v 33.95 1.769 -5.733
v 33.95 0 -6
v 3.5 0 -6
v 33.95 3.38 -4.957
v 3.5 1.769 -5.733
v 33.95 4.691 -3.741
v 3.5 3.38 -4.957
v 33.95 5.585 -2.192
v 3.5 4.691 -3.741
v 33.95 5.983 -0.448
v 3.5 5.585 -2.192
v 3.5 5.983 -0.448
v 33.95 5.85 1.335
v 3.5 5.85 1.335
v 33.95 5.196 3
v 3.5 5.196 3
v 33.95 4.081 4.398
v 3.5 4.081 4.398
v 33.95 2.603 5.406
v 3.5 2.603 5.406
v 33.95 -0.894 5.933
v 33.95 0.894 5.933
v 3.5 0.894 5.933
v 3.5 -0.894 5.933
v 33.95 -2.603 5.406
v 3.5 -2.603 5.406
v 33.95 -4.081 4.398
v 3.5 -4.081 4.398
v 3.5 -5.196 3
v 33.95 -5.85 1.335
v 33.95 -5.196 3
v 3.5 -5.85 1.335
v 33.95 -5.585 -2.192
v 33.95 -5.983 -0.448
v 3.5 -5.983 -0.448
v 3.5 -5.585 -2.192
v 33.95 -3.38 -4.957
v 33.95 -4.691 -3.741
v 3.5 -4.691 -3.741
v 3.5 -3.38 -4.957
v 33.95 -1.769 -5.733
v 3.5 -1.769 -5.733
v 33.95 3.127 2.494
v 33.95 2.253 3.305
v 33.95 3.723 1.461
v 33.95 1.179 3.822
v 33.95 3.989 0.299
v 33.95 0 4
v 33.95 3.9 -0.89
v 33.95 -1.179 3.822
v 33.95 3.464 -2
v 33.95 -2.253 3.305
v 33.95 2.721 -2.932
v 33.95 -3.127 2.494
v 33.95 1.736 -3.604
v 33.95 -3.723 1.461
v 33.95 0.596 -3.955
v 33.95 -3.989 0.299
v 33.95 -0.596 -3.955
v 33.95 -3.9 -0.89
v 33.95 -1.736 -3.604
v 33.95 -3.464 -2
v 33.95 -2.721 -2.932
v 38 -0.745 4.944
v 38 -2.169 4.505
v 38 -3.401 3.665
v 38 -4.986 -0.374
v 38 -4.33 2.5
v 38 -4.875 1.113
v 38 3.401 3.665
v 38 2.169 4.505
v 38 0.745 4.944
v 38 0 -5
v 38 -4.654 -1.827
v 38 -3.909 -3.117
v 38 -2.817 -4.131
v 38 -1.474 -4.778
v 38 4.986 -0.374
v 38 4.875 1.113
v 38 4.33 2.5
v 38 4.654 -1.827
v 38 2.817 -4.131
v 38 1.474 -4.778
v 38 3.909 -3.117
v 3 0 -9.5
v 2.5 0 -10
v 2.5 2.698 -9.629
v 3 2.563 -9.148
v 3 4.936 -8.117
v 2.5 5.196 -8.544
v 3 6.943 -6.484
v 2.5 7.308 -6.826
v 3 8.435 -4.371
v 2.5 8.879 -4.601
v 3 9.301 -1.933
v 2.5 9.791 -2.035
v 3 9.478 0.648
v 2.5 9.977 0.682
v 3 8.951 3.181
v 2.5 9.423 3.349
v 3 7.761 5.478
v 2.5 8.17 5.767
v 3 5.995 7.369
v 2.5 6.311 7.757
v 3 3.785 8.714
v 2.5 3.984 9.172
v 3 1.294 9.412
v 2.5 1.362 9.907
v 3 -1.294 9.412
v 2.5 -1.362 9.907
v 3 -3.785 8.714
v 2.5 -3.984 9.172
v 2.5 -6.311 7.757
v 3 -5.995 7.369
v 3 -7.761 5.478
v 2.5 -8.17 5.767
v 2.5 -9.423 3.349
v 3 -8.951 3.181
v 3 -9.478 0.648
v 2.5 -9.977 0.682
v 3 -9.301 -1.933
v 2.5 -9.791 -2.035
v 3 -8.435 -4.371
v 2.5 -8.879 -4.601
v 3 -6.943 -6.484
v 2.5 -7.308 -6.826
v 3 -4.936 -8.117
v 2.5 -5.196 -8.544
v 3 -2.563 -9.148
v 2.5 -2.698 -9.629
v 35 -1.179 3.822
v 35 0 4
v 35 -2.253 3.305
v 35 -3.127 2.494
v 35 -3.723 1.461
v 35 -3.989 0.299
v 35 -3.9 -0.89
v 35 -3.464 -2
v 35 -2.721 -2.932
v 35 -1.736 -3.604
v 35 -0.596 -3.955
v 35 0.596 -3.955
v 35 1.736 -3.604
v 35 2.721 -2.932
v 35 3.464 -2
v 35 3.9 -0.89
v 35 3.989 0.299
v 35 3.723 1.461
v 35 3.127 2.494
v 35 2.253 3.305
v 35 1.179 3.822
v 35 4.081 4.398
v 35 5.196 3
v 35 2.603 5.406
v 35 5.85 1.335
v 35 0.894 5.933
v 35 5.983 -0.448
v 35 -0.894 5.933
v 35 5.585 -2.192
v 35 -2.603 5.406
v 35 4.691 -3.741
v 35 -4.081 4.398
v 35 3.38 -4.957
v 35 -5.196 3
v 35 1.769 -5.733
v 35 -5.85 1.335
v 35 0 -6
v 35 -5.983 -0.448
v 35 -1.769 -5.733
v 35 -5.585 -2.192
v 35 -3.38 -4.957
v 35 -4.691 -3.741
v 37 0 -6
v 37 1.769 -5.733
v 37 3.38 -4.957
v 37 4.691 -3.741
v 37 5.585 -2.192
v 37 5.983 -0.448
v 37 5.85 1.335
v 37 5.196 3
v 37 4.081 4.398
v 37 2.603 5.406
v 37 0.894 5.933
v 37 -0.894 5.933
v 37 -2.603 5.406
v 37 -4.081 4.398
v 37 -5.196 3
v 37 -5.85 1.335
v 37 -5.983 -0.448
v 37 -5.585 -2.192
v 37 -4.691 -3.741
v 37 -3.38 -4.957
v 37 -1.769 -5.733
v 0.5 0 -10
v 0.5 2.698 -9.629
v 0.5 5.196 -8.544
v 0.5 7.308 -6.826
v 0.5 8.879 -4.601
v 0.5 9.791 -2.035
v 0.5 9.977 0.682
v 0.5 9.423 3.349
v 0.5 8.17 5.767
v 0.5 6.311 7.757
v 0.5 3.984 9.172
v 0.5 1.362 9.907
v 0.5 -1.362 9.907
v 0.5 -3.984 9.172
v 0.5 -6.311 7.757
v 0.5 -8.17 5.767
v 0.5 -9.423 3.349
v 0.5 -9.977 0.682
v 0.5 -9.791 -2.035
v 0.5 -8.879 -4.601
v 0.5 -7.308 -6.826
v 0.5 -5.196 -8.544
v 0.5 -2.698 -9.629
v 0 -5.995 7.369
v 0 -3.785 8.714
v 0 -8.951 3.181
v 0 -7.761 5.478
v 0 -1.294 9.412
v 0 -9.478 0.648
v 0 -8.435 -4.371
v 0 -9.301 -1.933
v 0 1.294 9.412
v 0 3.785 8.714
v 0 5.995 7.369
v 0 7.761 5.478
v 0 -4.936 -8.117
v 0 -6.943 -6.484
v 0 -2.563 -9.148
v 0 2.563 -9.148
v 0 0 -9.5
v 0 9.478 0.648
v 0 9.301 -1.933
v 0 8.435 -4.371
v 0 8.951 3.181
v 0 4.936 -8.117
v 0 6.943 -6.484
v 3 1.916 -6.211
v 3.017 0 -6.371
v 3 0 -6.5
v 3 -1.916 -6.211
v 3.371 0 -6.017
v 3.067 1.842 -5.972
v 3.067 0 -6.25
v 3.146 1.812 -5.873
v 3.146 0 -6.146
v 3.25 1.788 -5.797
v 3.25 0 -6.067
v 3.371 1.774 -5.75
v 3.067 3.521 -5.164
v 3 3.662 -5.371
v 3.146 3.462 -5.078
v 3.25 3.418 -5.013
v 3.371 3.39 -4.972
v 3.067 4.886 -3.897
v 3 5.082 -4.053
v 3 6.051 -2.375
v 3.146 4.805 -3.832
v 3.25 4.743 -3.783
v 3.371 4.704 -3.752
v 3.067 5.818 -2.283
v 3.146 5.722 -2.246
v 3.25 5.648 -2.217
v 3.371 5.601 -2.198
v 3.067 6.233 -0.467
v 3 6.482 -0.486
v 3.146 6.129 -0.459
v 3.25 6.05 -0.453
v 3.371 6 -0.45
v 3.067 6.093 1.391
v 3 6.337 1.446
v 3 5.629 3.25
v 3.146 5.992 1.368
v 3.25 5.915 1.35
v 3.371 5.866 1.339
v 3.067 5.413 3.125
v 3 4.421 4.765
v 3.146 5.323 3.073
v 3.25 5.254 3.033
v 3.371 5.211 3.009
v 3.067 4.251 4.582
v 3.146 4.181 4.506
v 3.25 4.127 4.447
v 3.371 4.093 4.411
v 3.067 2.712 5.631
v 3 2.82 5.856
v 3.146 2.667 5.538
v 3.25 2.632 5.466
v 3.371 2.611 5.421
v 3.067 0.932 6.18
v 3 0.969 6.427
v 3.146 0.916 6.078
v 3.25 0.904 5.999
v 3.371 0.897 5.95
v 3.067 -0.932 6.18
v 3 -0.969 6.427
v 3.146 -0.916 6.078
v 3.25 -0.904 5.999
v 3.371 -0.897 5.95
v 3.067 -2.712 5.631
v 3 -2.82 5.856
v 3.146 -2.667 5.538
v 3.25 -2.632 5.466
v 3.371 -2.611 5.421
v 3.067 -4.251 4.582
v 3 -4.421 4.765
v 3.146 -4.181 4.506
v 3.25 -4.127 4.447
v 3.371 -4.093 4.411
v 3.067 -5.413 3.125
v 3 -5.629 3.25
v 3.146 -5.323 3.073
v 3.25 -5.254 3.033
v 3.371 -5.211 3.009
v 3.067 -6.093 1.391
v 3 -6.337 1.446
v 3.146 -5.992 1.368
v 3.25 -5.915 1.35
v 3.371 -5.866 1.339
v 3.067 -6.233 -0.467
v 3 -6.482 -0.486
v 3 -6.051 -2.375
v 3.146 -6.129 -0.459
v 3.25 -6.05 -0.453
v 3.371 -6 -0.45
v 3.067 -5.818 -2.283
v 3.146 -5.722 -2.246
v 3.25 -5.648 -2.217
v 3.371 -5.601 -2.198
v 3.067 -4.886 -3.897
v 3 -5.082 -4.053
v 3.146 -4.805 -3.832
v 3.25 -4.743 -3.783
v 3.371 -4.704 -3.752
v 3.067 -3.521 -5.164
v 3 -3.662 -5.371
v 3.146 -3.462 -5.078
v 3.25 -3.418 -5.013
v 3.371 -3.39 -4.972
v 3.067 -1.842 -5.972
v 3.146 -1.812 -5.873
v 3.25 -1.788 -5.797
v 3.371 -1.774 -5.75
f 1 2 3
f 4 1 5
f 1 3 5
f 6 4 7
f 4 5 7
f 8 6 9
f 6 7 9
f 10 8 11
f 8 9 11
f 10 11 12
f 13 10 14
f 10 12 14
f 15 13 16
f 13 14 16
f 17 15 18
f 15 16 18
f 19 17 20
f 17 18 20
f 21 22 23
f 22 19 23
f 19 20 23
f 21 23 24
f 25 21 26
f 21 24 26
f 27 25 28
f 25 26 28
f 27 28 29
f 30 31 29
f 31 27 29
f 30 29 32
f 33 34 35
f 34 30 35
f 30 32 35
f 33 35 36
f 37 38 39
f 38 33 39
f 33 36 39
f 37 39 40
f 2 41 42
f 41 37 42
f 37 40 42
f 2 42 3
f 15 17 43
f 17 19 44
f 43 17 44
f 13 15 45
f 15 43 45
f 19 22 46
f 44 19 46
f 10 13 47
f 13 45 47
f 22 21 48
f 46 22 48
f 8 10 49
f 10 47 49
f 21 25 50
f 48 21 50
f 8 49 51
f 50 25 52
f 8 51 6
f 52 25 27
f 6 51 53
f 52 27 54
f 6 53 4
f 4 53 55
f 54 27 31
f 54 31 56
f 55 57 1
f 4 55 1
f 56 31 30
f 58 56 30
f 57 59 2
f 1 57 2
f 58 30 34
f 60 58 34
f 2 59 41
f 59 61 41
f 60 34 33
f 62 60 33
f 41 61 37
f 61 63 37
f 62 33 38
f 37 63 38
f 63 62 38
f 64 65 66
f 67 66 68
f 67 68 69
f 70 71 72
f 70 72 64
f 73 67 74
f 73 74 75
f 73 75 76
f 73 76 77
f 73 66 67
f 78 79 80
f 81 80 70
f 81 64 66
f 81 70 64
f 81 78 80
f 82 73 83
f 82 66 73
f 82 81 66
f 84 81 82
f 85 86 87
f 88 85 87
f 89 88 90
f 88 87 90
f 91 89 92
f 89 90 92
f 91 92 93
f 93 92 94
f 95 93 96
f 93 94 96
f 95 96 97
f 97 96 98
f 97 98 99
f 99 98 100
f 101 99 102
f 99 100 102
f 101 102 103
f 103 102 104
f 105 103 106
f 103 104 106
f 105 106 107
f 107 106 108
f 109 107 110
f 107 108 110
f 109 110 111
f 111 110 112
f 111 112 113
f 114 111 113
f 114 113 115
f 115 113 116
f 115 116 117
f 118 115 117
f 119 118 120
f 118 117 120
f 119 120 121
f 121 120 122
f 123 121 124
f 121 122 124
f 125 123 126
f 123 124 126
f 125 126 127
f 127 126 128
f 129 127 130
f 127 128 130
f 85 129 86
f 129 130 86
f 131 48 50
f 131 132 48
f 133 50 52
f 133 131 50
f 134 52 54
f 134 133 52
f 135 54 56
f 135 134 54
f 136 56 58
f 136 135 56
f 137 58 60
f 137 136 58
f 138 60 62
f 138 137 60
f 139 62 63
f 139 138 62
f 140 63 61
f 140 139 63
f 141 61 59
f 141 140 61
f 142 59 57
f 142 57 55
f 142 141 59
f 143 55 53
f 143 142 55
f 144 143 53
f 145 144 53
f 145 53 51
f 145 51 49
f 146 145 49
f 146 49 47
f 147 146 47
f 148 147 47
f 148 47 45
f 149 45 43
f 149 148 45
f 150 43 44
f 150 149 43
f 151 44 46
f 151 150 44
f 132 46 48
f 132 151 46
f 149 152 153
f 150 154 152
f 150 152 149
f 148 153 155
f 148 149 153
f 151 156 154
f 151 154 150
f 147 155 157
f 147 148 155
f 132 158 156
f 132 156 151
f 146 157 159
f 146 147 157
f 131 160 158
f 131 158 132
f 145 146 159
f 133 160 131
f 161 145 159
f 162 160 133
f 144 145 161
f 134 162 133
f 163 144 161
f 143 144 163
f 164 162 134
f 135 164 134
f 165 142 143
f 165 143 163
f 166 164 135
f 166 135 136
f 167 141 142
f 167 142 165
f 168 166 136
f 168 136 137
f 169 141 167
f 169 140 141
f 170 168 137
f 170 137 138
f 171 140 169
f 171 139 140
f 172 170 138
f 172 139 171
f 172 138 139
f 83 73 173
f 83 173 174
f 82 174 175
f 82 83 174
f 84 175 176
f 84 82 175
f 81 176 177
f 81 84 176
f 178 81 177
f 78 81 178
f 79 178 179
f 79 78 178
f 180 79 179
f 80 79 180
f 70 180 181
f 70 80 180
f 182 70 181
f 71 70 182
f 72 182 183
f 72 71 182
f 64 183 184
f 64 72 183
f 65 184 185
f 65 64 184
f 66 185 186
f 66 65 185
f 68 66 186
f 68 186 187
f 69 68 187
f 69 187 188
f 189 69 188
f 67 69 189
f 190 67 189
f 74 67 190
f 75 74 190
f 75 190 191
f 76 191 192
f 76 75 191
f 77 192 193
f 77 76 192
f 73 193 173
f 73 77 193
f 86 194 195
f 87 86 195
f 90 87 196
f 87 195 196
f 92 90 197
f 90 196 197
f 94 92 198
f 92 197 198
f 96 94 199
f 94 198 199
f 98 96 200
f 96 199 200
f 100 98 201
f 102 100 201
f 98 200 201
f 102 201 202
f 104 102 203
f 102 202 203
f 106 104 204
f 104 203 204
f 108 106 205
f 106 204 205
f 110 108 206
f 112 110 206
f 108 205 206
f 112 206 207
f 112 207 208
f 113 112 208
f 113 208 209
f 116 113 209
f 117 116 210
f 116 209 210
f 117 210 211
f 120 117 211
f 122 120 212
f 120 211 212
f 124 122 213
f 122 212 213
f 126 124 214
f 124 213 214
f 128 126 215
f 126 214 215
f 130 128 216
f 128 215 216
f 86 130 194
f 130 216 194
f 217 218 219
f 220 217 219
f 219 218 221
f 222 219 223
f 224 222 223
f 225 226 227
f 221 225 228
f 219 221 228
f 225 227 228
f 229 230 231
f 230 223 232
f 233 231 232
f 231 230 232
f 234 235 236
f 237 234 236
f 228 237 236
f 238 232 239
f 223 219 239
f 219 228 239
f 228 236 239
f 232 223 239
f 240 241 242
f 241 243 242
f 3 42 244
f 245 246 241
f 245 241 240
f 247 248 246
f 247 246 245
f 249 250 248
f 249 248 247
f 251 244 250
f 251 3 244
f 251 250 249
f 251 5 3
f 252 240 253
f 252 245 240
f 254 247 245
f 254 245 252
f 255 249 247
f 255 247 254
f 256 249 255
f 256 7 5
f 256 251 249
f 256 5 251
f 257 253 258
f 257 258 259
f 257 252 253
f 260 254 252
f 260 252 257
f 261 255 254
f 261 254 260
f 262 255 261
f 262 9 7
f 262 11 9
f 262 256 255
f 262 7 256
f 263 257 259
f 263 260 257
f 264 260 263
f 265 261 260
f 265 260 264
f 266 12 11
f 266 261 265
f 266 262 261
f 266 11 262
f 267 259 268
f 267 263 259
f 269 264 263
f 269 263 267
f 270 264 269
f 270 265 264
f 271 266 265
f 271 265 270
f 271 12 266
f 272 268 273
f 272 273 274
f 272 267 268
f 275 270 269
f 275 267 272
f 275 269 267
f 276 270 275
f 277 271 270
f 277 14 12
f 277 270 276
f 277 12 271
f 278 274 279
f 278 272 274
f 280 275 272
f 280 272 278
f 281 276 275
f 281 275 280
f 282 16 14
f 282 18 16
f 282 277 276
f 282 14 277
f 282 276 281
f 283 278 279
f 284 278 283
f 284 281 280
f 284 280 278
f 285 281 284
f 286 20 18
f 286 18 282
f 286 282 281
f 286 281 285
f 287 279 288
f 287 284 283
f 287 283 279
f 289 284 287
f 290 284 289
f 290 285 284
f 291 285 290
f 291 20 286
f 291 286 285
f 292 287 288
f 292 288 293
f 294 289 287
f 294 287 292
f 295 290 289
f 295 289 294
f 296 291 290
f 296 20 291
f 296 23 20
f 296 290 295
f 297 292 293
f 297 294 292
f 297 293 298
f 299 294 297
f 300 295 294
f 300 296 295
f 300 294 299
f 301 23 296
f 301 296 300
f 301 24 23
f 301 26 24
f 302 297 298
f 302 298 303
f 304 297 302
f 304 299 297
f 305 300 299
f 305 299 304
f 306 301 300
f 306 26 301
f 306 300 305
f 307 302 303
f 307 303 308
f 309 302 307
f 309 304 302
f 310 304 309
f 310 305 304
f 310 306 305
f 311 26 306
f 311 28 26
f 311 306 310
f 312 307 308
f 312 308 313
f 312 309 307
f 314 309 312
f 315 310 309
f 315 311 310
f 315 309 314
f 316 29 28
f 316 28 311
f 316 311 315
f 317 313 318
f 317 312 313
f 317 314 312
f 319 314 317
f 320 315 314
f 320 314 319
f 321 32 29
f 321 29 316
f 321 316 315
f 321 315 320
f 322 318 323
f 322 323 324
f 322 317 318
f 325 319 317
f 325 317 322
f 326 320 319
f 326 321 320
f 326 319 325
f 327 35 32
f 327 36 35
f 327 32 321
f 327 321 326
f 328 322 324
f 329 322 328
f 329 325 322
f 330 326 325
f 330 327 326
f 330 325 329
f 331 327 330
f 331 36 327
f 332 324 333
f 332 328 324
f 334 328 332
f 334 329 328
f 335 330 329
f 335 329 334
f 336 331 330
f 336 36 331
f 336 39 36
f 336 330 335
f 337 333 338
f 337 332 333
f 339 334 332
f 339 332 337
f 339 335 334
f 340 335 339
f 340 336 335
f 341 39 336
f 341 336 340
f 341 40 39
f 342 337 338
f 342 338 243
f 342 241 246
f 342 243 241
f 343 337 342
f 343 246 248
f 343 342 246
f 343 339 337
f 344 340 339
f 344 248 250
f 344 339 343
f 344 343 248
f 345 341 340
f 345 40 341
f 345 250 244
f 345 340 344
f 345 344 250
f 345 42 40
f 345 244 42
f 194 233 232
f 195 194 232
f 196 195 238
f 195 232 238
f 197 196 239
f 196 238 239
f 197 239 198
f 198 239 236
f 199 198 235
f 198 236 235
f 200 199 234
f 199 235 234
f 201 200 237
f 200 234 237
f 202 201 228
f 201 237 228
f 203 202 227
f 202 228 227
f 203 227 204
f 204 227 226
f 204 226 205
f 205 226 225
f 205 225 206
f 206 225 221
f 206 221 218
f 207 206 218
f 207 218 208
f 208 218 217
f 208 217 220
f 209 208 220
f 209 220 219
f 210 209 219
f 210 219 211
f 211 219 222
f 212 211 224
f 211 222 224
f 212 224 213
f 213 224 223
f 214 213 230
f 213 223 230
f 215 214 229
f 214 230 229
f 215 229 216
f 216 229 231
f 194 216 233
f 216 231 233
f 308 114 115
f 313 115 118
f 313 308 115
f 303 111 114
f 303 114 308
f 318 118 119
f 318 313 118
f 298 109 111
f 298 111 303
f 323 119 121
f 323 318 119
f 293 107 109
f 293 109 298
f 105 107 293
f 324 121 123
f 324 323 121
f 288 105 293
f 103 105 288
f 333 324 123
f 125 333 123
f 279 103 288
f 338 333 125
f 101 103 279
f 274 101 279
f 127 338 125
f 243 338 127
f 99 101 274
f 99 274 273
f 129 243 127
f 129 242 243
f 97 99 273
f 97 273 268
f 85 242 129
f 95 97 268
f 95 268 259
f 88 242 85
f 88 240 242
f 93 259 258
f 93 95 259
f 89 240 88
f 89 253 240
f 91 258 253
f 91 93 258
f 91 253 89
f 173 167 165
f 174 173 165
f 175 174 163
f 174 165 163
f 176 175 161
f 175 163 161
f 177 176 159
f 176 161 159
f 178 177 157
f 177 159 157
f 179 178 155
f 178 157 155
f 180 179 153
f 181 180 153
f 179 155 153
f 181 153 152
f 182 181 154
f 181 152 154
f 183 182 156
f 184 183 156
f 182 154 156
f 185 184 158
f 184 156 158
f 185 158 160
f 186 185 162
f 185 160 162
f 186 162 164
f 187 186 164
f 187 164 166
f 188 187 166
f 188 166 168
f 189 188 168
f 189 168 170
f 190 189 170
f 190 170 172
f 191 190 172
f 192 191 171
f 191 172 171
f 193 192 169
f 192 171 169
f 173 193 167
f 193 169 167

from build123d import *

# Parameters (mm, degrees)
SCHIZZO1_R                   = 10
ESTRUSIONE_ESTRUSIONE1_DEPTH = 3
SCHIZZO2_R                   = 6
ESTRUSIONE_ESTRUSIONE2_DEPTH = 35
SCHIZZO3_W                   = 1.05
SCHIZZO3_H                   = 2
SMUSSO1_SIZE                 = 1
SMUSSO2_SIZE                 = 0.5
RACCORDO1_R                  = 0.5


with BuildPart() as part:
    # Schizzo1 → Estrusione-Estrusione1 (new body)
    with BuildSketch(Plane(origin=(0, 0, 0), x_dir=(0, 0, -1), z_dir=(1, 0, 0))):
        Circle(SCHIZZO1_R)
    extrude(amount=ESTRUSIONE_ESTRUSIONE1_DEPTH)

    # Schizzo2 → Estrusione-Estrusione2 (add)
    with BuildSketch(Plane(origin=(3, 0, 0), x_dir=(0, 0, -1), z_dir=(1, 0, 0))):
        Circle(SCHIZZO2_R)
    extrude(amount=ESTRUSIONE_ESTRUSIONE2_DEPTH)

    # Schizzo3 → Taglia-Rivoluzione1 (revolve, cut)
    with BuildSketch(Plane.XY, mode=Mode.PRIVATE) as taglia_rivoluzione1_sk:
        with Locations((34.475, 5)):
            Rectangle(SCHIZZO3_W, SCHIZZO3_H)
    revolve(taglia_rivoluzione1_sk.sketch.rotate(Axis((0, 0, 0), (1, 0, 0)), 90), axis=Axis((0, 0, 0), (1, 0, 0)), mode=Mode.SUBTRACT)

    # Smusso1
    smusso1_edges = [part.edges().sort_by_distance(p)[0] for p in [
        (38, 0, 6),
    ]]
    chamfer(smusso1_edges, length=SMUSSO1_SIZE)

    # Smusso2
    smusso2_edges = [part.edges().sort_by_distance(p)[0] for p in [
        (0, 0, 10),
        (3, 0, 10),
    ]]
    chamfer(smusso2_edges, length=SMUSSO2_SIZE)

    # Raccordo1
    raccordo1_edges = [part.edges().sort_by_distance(p)[0] for p in [
        (3, 0, 6),
    ]]
    fillet(raccordo1_edges, radius=RACCORDO1_R)


solid = part.part
